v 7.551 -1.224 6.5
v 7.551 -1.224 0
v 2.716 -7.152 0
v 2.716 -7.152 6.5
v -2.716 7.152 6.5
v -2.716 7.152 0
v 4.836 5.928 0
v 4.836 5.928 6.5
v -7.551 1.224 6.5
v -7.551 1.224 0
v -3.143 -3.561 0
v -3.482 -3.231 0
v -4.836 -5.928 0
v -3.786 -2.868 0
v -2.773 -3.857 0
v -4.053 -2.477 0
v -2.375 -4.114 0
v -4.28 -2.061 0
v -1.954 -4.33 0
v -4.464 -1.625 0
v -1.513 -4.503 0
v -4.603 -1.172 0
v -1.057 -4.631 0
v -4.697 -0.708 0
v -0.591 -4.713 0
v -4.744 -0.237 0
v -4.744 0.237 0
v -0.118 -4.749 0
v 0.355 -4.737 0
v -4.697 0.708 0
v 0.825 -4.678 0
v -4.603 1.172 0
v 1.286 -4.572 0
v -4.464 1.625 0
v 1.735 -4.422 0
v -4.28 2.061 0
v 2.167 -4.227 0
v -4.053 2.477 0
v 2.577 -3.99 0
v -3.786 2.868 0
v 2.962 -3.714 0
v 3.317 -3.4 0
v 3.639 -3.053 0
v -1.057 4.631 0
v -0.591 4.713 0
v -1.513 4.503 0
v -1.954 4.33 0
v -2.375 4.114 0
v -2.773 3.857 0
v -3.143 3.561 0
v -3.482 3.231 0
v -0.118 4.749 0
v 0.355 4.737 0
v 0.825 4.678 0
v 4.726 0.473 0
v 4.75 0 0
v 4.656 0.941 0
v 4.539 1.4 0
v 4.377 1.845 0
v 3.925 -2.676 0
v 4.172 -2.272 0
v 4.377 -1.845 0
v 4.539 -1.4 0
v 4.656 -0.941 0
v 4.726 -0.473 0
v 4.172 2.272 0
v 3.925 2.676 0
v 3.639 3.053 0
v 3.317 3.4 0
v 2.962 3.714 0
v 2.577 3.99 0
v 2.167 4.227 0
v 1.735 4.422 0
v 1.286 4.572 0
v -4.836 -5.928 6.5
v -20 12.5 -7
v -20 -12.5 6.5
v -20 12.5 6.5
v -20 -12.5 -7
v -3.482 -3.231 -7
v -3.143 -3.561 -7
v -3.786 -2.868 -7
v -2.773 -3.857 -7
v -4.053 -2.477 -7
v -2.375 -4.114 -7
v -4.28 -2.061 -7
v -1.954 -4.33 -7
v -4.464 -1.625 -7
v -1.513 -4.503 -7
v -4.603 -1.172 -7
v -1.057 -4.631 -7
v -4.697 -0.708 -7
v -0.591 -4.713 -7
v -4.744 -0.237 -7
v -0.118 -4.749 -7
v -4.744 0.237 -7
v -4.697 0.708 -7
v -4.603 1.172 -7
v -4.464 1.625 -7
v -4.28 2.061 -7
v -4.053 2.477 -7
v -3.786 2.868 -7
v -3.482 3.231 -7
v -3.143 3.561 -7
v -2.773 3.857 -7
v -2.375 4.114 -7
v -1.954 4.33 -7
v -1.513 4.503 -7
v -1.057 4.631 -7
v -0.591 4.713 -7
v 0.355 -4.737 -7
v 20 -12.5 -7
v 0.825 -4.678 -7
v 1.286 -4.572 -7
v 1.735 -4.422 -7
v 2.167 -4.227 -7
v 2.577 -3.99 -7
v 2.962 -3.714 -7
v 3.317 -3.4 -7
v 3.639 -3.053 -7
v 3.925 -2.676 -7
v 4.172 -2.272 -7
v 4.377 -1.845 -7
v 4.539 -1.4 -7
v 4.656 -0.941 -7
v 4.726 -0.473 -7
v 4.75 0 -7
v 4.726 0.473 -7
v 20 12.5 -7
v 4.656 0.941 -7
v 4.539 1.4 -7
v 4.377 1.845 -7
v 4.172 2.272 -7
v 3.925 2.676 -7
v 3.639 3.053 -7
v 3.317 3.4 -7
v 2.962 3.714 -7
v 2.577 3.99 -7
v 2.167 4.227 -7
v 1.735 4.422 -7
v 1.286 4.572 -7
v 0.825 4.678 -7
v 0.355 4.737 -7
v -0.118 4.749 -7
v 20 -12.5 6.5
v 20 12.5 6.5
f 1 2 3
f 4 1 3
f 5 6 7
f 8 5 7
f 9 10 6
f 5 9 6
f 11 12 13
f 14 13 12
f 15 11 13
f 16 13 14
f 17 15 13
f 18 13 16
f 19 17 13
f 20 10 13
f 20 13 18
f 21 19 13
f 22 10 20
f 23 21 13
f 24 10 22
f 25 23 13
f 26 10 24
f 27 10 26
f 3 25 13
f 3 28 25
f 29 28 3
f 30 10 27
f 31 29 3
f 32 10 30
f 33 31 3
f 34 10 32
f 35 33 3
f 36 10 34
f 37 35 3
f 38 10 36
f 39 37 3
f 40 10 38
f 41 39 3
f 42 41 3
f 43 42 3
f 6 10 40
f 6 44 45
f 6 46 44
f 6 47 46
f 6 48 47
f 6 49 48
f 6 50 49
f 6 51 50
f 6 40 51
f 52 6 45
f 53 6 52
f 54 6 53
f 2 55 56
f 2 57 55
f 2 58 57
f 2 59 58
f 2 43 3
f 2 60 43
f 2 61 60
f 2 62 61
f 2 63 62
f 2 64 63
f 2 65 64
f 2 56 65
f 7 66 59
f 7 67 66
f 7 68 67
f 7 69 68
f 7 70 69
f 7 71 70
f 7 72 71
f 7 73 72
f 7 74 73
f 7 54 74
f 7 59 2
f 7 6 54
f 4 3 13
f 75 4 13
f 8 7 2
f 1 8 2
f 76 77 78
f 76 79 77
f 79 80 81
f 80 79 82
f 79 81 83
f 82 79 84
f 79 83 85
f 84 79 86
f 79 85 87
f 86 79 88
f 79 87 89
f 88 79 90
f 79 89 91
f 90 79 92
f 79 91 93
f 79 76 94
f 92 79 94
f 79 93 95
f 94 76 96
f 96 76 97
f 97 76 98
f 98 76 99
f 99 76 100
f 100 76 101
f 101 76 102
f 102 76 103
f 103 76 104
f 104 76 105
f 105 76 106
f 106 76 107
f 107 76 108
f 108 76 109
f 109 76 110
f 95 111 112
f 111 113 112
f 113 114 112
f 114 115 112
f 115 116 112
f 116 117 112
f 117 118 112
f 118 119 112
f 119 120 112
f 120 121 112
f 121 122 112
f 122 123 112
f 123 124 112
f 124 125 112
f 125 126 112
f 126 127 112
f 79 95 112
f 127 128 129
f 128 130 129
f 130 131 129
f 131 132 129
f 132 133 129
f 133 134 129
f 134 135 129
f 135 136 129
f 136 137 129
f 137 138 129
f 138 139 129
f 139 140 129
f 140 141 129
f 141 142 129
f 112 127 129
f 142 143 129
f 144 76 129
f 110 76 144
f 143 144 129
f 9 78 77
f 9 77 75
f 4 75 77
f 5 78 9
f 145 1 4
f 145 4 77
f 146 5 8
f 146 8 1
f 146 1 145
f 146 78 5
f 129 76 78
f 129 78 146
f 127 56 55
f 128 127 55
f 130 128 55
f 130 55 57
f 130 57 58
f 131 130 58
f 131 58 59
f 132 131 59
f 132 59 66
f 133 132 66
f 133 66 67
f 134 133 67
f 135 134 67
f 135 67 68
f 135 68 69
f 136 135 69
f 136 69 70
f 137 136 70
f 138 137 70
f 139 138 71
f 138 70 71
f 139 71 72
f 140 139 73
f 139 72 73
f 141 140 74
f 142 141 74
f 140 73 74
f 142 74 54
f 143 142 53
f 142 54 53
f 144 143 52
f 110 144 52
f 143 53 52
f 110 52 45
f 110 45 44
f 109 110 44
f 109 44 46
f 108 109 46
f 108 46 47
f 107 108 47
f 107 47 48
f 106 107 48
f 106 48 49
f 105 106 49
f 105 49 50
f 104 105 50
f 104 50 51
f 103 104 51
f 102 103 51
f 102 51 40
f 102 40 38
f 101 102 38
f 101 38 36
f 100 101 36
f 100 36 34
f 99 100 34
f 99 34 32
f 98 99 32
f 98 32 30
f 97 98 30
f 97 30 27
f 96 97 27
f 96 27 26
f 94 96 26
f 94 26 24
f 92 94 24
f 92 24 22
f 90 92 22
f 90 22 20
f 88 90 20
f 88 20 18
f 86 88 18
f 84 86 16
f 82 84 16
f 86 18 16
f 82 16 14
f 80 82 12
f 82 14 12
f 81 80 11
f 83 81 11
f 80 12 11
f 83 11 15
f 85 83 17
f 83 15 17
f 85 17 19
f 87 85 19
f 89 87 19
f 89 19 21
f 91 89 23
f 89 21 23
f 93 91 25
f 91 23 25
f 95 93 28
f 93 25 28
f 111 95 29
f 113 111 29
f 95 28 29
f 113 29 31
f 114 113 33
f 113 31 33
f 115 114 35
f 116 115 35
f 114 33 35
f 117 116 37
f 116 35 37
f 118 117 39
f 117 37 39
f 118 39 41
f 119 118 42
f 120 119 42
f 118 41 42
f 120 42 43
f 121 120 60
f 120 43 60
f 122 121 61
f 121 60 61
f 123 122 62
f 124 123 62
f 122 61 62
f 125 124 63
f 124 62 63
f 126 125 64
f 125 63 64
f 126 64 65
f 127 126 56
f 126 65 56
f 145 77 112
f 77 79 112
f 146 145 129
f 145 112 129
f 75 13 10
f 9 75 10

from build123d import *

# Parameters (mm, degrees)
F0_W     = 40
F0_H     = 25
F1_DEPTH = 7
F3_DEPTH = 6.5
F4_R     = 4.75
F5_DEPTH = 10


# Not quite as in the source:
# - a feature names something its author has since deleted; it is built from what else it names


with BuildPart() as f1:
    # F0 (on Top) → F1 (new body)
    with BuildSketch(Plane.XY):
        Rectangle(F0_W, F0_H)
        Polygon((-2.7157951384, 7.1515935357), (4.8355641102, 5.9277443492), (7.5513592486, -1.2238491865), (2.7157951384, -7.1515935357), (-4.8355641102, -5.9277443492), (-7.5513592486, 1.2238491865), align=None, mode=Mode.SUBTRACT)
        Polygon((7.5513592486, -1.2238491865), (4.8355641102, 5.9277443492), (-2.7157951384, 7.1515935357), (-7.5513592486, 1.2238491865), (-4.8355641102, -5.9277443492), (2.7157951384, -7.1515935357), align=None)
    extrude(amount=-F1_DEPTH)

    # F0 (on Top) → F3 (join)
    with BuildSketch(Plane.XY):
        Rectangle(F0_W, F0_H)
        Polygon((-2.7157951384, 7.1515935357), (4.8355641102, 5.9277443492), (7.5513592486, -1.2238491865), (2.7157951384, -7.1515935357), (-4.8355641102, -5.9277443492), (-7.5513592486, 1.2238491865), align=None, mode=Mode.SUBTRACT)
    extrude(amount=F3_DEPTH)

    # F4 (on Top) → F5 (cut)
    with BuildSketch(Plane.XY):
        Circle(F4_R)
    extrude(amount=-F5_DEPTH, mode=Mode.SUBTRACT)


solid = f1.part
